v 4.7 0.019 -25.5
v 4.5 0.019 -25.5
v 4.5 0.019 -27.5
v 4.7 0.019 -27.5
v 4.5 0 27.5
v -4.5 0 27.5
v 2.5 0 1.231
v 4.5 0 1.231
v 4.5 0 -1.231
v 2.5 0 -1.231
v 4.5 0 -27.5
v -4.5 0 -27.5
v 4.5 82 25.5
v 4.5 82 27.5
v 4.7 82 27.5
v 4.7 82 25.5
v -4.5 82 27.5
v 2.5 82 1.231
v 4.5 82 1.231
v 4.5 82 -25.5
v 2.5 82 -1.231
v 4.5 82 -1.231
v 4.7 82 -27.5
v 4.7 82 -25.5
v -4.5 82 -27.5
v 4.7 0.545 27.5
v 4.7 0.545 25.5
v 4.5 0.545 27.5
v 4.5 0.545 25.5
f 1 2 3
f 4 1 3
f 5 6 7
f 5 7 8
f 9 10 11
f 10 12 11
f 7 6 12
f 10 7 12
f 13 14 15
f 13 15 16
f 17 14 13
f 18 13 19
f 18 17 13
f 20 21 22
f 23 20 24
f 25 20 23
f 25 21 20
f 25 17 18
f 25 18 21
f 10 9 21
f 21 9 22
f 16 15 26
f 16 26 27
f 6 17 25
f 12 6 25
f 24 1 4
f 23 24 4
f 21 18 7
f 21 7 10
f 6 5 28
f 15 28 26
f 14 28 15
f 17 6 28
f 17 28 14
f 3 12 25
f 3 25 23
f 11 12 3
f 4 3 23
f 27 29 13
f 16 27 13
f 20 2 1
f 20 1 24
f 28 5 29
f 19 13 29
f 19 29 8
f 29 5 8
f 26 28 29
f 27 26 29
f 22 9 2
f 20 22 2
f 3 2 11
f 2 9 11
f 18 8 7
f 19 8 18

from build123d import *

# Parameters (mm, degrees)
SKETCH1_W           = 9
SKETCH1_H           = 55
BOSS_EXTRUDE1_DEPTH = 82
SKETCH2_W           = 1.230757027
SKETCH2_H           = 82
CUT_EXTRUDE1_DEPTH  = 2
SKETCH3_W           = 2
SKETCH3_H           = 81.454636245
SKETCH3_H_2         = 81.981396298
BOSS_EXTRUDE2_DEPTH = 0.2


with BuildPart() as part:
    # Sketch1 → Boss-Extrude1 (new body)
    with BuildSketch(Plane(origin=(0, 0, 0), x_dir=(1, 0, 0), z_dir=(0, 1, 0))):
        Rectangle(SKETCH1_W, SKETCH1_H)
    extrude(amount=BOSS_EXTRUDE1_DEPTH)

    # Sketch2 → Cut-Extrude1 (cut)
    with BuildSketch(Plane(origin=(4.5, 0, 0), x_dir=(0, 0, -1), z_dir=(1, 0, 0))):
        with Locations((-0.615378514, 41)):
            Rectangle(SKETCH2_W, SKETCH2_H)
        with Locations((0.615378514, 41)):
            Rectangle(SKETCH2_W, SKETCH2_H)
    extrude(amount=-CUT_EXTRUDE1_DEPTH, mode=Mode.SUBTRACT)

    # Sketch3 → Boss-Extrude2 (add)
    with BuildSketch(Plane(origin=(4.5, 0, 0), x_dir=(0, 0, -1), z_dir=(1, 0, 0))):
        with Locations((-26.5, 41.272681877)):
            Rectangle(SKETCH3_W, SKETCH3_H)
        with Locations((26.5, 41.009301851)):
            Rectangle(SKETCH3_W, SKETCH3_H_2)
    extrude(amount=BOSS_EXTRUDE2_DEPTH)


solid = part.part
